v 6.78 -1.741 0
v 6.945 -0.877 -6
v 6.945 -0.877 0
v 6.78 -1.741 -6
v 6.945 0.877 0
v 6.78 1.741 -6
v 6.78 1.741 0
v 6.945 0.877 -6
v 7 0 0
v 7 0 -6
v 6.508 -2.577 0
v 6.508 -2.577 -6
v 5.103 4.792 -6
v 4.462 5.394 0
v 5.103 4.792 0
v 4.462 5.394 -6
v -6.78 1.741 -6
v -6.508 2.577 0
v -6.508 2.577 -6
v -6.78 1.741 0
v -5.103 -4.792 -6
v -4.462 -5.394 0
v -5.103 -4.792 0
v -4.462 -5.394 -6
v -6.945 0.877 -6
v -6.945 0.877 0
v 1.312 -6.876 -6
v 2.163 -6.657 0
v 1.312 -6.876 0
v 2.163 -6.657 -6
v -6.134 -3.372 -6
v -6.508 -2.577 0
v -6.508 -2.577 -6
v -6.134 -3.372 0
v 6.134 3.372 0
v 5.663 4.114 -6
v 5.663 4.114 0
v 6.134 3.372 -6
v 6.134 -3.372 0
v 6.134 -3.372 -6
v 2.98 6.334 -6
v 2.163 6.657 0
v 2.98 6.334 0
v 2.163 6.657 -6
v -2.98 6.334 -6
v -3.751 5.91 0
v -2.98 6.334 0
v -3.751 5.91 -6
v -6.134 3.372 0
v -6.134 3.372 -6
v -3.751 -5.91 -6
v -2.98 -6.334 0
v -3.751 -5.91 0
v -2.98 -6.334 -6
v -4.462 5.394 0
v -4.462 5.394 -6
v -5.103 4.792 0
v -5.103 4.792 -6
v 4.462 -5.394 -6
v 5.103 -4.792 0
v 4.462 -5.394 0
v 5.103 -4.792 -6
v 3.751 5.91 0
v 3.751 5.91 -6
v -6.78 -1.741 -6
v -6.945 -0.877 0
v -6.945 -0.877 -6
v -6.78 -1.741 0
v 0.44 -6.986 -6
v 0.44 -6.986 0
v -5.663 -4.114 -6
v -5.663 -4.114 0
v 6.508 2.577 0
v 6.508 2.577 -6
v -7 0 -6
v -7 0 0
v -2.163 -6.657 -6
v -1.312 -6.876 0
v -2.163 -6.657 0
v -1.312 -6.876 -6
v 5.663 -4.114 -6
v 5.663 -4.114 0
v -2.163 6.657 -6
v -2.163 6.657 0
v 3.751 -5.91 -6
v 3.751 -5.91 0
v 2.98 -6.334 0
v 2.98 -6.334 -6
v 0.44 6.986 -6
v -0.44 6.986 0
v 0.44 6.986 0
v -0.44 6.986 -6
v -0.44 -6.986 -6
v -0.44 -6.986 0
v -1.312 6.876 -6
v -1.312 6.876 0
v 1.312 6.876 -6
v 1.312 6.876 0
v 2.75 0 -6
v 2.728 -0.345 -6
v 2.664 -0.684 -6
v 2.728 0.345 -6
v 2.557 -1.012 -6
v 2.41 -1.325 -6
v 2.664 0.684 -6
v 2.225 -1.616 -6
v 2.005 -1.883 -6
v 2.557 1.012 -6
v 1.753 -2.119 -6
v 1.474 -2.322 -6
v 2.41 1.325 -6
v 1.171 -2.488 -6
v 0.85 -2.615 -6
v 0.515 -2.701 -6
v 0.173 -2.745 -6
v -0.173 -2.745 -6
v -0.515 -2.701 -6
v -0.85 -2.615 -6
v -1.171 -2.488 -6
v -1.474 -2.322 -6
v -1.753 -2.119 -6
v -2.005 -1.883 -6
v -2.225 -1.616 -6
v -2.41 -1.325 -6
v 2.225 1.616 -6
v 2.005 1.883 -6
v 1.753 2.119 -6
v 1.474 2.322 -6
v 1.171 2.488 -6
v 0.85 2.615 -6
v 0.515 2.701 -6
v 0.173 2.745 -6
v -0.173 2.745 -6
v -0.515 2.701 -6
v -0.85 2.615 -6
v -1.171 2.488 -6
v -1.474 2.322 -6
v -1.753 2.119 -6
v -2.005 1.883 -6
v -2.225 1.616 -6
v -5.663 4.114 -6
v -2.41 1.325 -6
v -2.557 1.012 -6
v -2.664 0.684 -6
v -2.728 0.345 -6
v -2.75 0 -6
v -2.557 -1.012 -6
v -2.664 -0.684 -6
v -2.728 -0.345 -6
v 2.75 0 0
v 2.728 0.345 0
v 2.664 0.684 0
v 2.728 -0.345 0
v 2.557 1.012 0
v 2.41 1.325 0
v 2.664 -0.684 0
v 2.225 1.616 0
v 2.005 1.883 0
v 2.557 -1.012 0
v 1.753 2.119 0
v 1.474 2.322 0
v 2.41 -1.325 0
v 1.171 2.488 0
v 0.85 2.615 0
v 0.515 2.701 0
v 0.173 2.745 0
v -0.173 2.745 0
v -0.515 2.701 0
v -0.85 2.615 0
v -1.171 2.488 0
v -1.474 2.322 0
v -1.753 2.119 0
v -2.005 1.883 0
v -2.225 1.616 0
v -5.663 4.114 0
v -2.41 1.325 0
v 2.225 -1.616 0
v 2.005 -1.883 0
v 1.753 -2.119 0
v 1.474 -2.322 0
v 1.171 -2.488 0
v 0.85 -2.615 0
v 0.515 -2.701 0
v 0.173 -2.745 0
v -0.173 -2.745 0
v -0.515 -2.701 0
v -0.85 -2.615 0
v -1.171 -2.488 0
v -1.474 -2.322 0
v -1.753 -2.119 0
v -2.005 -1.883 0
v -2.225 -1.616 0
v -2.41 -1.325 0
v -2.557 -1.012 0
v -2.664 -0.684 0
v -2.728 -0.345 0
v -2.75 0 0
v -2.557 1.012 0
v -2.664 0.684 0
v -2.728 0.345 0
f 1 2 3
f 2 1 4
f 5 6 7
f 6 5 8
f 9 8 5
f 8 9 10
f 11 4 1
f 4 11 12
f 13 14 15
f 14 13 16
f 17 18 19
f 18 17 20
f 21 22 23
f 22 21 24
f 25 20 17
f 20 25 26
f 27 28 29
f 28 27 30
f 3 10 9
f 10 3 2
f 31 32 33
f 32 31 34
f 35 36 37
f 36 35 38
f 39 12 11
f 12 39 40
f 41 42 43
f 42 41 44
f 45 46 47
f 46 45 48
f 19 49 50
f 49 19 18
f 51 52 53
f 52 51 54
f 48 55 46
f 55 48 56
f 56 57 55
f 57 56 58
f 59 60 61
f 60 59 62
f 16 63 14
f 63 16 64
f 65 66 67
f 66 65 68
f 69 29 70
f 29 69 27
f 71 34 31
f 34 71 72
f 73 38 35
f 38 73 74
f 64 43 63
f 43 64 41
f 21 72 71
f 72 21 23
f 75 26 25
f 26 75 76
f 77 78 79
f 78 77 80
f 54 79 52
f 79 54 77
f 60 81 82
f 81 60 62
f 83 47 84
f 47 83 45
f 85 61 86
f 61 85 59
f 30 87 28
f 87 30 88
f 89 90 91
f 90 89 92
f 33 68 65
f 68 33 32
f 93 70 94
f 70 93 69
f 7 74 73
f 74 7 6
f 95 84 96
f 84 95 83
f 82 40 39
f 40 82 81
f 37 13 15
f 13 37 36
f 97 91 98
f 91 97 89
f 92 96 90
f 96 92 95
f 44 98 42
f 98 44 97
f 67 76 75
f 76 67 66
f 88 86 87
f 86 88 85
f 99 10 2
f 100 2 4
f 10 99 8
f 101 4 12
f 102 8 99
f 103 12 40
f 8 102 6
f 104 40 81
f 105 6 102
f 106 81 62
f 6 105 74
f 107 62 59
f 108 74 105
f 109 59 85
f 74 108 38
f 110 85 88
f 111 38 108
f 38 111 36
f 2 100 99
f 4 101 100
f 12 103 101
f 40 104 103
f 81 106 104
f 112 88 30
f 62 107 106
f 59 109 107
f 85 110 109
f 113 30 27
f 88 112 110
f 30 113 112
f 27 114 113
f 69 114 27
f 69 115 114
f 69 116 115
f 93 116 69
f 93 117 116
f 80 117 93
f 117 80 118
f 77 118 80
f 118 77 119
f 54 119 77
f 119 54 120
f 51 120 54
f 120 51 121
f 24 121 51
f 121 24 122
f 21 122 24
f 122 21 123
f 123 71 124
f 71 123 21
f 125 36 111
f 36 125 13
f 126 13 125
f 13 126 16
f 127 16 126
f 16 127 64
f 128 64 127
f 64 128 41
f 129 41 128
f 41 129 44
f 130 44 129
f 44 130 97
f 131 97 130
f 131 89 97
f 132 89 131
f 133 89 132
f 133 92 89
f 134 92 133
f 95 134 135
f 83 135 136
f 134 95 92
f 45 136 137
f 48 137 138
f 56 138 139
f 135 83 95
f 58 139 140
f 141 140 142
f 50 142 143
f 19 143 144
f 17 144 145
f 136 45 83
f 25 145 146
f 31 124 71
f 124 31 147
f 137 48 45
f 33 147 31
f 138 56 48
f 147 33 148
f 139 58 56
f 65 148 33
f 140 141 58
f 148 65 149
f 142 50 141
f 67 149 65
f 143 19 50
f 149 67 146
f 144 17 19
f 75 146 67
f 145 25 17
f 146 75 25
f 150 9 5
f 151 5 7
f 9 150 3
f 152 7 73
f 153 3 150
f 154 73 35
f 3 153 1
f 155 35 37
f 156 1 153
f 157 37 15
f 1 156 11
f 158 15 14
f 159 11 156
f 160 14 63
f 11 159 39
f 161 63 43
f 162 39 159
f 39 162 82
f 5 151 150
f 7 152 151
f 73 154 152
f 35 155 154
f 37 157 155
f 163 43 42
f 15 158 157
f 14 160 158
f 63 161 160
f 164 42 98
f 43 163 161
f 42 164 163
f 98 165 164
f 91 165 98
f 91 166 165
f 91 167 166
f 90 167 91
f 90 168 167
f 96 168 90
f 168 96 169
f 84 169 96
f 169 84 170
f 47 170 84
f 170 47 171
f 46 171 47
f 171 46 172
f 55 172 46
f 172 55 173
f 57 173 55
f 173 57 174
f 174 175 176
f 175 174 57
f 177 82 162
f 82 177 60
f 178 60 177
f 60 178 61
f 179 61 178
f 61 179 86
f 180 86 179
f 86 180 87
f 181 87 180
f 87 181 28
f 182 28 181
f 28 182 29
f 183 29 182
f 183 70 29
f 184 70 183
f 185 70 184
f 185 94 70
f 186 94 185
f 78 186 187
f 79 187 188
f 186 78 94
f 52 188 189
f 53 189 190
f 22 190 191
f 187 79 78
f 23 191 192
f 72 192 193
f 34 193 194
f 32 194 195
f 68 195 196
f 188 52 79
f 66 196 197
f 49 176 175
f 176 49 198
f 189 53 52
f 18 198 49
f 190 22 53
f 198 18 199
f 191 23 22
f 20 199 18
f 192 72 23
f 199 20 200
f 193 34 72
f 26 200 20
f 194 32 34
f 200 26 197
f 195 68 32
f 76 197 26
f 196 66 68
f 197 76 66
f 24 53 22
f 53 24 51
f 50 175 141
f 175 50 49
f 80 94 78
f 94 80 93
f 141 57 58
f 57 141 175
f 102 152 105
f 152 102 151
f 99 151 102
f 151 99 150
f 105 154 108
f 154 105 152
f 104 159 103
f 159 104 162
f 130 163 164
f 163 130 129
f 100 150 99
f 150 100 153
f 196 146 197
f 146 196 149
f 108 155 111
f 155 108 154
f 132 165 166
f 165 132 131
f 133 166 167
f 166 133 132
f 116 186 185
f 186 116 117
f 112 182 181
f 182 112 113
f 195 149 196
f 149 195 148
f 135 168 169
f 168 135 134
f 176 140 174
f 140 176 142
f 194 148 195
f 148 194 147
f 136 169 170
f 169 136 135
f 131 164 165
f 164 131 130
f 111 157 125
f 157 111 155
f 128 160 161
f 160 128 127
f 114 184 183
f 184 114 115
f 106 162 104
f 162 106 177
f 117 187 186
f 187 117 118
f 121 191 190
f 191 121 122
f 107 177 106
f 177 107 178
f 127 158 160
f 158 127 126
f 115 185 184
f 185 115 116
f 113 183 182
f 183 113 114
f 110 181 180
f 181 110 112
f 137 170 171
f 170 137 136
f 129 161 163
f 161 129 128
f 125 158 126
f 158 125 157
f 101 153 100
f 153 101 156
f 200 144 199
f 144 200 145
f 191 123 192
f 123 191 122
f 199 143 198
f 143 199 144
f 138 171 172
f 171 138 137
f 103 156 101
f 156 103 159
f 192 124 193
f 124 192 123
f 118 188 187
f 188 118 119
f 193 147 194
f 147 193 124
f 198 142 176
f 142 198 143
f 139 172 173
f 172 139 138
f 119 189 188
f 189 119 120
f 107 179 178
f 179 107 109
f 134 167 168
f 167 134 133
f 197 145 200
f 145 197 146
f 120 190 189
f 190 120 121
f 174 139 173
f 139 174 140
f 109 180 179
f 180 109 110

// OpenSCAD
$fn = 50;


difference() {
	union() {
		translate(v = [0, 0, -6.0000000000]) {
			cylinder(h = 6, r = 7.0000000000);
		}
		cylinder(h = 0, r = 17.0000000000);
	}
	union() {
		#translate(v = [0, 0, -6]) {
			cylinder(h = 6, r = 2.7500000000);
		}
	}
}
